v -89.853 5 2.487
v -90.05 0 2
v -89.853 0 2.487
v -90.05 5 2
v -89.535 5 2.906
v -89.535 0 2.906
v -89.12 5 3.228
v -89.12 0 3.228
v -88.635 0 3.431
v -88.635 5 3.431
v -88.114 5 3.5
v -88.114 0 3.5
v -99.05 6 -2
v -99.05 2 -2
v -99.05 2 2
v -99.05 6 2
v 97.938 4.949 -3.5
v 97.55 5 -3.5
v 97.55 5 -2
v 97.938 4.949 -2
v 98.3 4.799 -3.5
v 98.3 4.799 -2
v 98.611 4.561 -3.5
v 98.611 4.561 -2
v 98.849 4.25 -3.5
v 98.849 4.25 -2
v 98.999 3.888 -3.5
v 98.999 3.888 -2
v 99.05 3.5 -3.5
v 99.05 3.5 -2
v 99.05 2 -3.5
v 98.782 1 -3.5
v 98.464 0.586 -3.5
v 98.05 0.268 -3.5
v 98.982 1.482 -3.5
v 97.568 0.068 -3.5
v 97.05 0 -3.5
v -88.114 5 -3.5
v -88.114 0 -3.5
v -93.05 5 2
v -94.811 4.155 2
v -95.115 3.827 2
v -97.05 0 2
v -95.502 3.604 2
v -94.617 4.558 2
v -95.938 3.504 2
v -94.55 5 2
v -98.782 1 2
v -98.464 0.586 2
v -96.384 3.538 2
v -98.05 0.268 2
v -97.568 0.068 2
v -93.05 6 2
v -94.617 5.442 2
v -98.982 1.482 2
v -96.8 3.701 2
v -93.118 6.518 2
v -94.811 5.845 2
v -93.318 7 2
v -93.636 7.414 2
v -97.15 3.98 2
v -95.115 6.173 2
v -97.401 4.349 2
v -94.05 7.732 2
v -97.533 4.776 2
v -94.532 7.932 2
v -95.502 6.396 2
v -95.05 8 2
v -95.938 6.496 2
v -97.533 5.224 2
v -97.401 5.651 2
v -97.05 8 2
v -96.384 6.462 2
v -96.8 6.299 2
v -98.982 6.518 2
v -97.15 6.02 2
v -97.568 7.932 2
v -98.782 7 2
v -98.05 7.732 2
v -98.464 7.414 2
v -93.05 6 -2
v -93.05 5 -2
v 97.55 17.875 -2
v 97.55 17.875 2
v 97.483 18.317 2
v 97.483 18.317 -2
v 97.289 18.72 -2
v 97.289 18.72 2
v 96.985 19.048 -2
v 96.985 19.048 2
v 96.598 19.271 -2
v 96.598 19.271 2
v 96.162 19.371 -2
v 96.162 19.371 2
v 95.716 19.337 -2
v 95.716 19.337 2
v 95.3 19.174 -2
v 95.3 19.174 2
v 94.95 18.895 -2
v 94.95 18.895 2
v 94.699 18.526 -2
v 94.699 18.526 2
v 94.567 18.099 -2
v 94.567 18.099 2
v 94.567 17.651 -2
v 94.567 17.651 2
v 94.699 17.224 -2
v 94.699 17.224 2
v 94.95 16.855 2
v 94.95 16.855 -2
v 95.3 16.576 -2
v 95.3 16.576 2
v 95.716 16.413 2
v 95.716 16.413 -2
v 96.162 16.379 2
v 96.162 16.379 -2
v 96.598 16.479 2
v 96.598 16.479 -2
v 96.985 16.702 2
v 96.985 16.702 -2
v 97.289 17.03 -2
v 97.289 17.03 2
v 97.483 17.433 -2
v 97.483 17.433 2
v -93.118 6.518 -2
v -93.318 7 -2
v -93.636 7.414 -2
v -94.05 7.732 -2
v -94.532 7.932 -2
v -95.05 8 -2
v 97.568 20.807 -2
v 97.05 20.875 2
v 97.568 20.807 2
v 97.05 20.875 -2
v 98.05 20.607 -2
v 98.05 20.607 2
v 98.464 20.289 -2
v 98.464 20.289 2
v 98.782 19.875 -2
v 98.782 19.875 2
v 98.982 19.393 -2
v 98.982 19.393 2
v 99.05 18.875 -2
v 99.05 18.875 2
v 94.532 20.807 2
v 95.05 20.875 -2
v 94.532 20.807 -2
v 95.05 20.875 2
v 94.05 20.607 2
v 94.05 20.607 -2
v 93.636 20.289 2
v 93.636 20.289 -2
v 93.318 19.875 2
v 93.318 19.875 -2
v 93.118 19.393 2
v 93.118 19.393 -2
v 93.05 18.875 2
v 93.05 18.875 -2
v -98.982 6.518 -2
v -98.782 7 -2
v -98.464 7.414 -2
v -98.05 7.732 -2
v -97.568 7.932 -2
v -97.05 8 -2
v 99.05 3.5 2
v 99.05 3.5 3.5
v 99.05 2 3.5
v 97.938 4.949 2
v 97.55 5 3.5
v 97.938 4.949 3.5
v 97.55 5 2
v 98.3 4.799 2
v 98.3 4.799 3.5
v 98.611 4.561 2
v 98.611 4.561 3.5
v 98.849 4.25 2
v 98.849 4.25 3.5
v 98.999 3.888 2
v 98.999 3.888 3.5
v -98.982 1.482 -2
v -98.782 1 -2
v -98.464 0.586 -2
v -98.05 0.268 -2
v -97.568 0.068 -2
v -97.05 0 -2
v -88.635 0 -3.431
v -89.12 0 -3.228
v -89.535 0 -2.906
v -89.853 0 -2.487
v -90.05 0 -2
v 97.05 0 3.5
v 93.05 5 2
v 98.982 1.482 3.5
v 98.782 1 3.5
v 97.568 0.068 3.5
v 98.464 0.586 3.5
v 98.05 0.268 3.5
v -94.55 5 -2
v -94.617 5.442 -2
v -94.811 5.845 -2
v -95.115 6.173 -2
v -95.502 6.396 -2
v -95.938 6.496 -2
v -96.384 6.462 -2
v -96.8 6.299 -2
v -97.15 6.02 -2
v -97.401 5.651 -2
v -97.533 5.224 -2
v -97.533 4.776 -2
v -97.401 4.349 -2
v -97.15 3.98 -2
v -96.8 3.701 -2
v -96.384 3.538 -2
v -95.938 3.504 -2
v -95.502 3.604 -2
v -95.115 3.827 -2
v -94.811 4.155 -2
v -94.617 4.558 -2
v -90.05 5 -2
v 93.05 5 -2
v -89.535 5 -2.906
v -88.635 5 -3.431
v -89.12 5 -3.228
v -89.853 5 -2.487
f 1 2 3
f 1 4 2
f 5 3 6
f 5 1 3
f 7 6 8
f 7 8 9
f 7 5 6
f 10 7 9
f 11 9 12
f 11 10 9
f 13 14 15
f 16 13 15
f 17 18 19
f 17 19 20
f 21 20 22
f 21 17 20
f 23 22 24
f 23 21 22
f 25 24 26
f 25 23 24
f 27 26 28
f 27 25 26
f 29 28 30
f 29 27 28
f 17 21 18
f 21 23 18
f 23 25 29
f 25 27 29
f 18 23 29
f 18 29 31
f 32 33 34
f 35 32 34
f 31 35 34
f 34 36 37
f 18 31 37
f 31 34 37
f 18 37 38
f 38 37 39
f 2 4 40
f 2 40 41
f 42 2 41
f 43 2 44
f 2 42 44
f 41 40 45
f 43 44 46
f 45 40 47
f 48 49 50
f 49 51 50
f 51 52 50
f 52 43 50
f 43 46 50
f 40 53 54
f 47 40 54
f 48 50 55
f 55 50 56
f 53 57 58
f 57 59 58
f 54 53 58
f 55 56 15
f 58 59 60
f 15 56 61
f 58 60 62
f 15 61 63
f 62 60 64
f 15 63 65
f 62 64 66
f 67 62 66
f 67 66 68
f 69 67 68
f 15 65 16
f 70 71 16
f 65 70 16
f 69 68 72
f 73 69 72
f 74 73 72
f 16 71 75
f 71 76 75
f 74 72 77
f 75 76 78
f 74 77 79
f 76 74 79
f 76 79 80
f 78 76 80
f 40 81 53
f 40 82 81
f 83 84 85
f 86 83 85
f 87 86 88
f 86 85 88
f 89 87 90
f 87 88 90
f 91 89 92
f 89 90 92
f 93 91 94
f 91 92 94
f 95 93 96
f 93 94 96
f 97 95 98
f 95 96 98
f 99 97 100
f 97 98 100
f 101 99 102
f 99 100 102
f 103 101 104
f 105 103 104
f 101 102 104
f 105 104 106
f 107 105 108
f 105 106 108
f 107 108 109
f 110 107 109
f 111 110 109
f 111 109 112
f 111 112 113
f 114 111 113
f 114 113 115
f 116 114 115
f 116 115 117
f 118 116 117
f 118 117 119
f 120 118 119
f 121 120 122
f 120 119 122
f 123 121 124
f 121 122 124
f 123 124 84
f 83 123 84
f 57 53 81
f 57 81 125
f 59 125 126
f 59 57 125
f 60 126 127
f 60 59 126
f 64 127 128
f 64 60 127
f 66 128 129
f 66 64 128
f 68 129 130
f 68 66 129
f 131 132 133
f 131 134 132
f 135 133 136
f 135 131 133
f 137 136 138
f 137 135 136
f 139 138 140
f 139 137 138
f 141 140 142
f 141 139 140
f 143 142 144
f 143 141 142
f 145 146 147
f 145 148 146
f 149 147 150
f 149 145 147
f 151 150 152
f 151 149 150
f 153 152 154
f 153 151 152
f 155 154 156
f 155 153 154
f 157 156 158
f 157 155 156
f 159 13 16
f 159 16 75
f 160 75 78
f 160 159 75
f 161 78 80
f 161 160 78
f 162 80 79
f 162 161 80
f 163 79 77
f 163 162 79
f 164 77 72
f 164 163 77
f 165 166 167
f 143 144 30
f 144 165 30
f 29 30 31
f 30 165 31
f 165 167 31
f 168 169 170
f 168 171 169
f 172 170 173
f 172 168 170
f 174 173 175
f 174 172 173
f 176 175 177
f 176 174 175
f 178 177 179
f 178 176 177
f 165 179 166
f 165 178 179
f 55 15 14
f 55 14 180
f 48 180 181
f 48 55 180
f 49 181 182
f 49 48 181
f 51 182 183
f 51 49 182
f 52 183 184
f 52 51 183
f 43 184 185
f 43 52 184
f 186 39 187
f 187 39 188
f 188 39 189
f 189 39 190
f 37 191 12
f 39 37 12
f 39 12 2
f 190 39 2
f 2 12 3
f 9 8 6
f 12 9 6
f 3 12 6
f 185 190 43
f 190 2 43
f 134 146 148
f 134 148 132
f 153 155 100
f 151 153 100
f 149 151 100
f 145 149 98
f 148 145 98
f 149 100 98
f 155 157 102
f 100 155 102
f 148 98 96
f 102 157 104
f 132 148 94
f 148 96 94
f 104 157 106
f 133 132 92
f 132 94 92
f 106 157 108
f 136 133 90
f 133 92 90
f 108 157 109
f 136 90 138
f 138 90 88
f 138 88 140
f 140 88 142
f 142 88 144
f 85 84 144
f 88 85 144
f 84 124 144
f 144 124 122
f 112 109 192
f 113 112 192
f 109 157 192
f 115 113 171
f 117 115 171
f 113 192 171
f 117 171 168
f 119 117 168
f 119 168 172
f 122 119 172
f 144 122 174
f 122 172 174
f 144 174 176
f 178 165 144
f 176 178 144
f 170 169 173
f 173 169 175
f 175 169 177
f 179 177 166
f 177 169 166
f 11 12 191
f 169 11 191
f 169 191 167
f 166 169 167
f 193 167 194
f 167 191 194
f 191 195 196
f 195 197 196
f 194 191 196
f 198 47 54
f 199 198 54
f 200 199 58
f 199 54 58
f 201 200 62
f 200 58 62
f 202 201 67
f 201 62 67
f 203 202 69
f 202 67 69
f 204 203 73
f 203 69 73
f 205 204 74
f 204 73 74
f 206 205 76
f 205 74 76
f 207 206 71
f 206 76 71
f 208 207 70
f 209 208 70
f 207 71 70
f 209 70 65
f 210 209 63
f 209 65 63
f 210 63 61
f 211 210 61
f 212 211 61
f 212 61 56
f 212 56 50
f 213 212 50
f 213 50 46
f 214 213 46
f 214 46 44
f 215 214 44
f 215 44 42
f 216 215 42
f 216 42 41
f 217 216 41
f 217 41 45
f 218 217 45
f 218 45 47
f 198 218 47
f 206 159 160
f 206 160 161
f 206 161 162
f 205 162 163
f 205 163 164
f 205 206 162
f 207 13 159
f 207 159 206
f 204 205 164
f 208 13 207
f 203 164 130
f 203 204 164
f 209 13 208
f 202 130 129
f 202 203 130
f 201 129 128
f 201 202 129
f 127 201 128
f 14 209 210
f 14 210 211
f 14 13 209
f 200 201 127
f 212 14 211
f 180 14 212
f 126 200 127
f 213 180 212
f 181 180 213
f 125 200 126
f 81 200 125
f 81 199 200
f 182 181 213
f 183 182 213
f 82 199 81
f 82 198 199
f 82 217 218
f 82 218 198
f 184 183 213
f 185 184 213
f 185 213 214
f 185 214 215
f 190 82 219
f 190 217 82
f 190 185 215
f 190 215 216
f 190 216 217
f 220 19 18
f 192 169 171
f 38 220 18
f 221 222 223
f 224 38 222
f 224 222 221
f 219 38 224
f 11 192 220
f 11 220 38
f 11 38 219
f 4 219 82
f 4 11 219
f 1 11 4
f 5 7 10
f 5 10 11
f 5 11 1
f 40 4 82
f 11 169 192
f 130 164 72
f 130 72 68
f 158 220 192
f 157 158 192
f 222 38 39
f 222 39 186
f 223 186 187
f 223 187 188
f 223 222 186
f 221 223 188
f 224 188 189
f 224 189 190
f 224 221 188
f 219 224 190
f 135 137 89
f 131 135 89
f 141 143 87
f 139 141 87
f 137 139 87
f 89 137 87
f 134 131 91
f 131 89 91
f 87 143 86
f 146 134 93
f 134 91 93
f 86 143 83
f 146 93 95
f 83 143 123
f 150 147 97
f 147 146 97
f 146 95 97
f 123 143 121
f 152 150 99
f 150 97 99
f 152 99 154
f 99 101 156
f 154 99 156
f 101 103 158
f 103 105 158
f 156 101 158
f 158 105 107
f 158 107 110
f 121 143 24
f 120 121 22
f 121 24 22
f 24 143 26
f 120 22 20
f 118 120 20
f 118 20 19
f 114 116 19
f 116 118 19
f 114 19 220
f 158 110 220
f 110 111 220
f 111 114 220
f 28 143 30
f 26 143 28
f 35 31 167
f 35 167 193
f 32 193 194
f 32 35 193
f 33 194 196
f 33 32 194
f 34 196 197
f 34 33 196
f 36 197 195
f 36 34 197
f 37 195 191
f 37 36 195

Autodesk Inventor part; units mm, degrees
ref_plane "YZ Plane" through (0, 0, 0) normal (1, 0, 0) x (0, 1, 0)
ref_plane "XZ Plane" through (0, 0, 0) normal (0, 1, 0) x (-1, 0, 0)
ref_plane "XY Plane" through (0, 0, 0) normal (0, 0, 1) x (1, 0, 0)
sketch "Sketch1" plane through (0, 0, 0) normal (0, 1, 0) x (-1, 0, 0)
  line L0 (99.05, 3.5) -> (-99.05, 3.5)
  line L1 (-99.05, 3.5) -> (-99.05, -3.5)
  line L2 (-99.05, -3.5) -> (99.05, -3.5)
  line L3 (99.05, -3.5) -> (99.05, 3.5)
  line L4 (99.05, 3.5) -> (-99.05, -3.5) construction
  line L5 (-99.05, 3.5) -> (99.05, -3.5) construction
  point P0 (0, 0)
  dimension "d0" = 198.1
  dimension "d1" = 7
extrude "Extrusion1" add sketch "Sketch1" along normal blind 5
sketch "Sketch2" plane through (0, 5, 0) normal (0, 1, 0) x (1, 0, 0)
  line L0 (99.05, -3.5) -> (99.05, 3.5) projected
  line L1 (99.05, 2) -> (93.05, 2)
  line L2 (93.05, 2) -> (93.05, -2)
  line L3 (93.05, -2) -> (99.05, -2)
  line L4 (99.05, -2) -> (99.05, 2)
  line L5 (99.05, 3.5) -> (-99.05, 3.5) projected
  point P0 (0, 0)
  dimension "d25" = 6
  dimension "d26" = 4
  dimension "d27" = 1.5
extrude "Extrusion2" add sketch "Sketch2" along normal blind 15.875
fillet "Fillet1" radius 2 2 edges at (99.05, 20.875, 0) (93.05, 20.875, 0)
sketch "Sketch4" plane through (0, 5, 0) normal (0, 1, 0) x (1, 0, 0)
  line L0 (99.05, 3.5) -> (-99.05, 3.5) projected
  line L1 (-99.05, 2) -> (-93.05, 2)
  line L2 (-93.05, 2) -> (-93.05, -2)
  line L3 (-93.05, -2) -> (-99.05, -2)
  line L4 (-99.05, -2) -> (-99.05, 2)
  line L5 (-99.05, 3.5) -> (-99.05, -3.5) projected
  point P0 (0, 0)
  dimension "d33" = 6
  dimension "d34" = 4
  dimension "d35" = 6
  dimension "d36" = 1.5
extrude "Extrusion4" add sketch "Sketch4" along normal blind 3
fillet "Fillet2" radius 2 2 edges at (-93.05, 8, 0) (-99.05, 8, 0)
fillet "Fillet3" radius 2 2 edges at (99.05, 0, 0) (-99.05, 0, 0)
sketch "Sketch6" plane through (93.05, 5, 2) normal (0, 0, 1) x (1, 0, 0)
  line L0 (0, 15.875) -> (6, 15.875) construction
  line L1 (3, 15.875) -> (3, 12.875) construction
  line L2 (3, 15.875) -> (6, 15.875) construction
  circle A0 centre (3, 12.875) radius 1.5
  point P0 (-93.05, -5)
  dimension "d28" = 3
  dimension "d29" = 90
  dimension "d30" = 3
extrude "Extrusion6" cut sketch "Sketch6" against normal through all
sketch "Sketch7" plane through (-99.05, 5, 2) normal (0, 0, 1) x (1, 0, 0)
  line L0 (4, 3) -> (2, 3) construction
  line L1 (3, 3) -> (3, 0) construction
  line L2 (3, 3) -> (6, 3) construction
  circle A0 centre (3, 0) radius 1.5
  point P0 (99.05, -5)
  dimension "d57" = 1.5
  dimension "d37" = 3
  dimension "d38" = 90
  dimension "d39" = 3
sketch "Sketch8" plane through (0, 5, 0) normal (0, 1, 0) x (1, 0, 0)
  line L0 (-99.05, -3.5) -> (99.05, -3.5) projected
  line L1 (-93.05, -2) -> (-99.05, -2) projected
  line L2 (-99.05, -2) -> (-90.05, -2)
  line L3 (-90.05, -2) -> (-90.05, -3.5)
  line L4 (-90.05, -3.5) -> (-99.05, -3.5)
  line L5 (-99.05, -3.5) -> (-99.05, -2)
  line L6 (-99.05, 3.5) -> (-90.05, 3.5)
  line L7 (-90.05, 3.5) -> (-90.05, 2)
  line L8 (-90.05, 2) -> (-99.05, 2)
  line L9 (-99.05, 2) -> (-99.05, 3.5)
  point P0 (0, 0)
  dimension "d54" = 9
  dimension "d55" = 1.5
  dimension "d56" = 9
  dimension "d57" = 1.5
extrude "Extrusion7" cut sketch "Sketch8" against normal through all
extrude "Extrusion8" cut sketch "Sketch7" against normal through all
fillet "Fillet5" radius 1.5 2 edges at (99.05, 5, 2.75) (99.05, 5, -2.75)
fillet "Fillet6" radius 2 2 edges at (-90.05, 2.5, 3.5) (-90.05, 2.5, -3.5)
properties part number "Brace_unequal"
